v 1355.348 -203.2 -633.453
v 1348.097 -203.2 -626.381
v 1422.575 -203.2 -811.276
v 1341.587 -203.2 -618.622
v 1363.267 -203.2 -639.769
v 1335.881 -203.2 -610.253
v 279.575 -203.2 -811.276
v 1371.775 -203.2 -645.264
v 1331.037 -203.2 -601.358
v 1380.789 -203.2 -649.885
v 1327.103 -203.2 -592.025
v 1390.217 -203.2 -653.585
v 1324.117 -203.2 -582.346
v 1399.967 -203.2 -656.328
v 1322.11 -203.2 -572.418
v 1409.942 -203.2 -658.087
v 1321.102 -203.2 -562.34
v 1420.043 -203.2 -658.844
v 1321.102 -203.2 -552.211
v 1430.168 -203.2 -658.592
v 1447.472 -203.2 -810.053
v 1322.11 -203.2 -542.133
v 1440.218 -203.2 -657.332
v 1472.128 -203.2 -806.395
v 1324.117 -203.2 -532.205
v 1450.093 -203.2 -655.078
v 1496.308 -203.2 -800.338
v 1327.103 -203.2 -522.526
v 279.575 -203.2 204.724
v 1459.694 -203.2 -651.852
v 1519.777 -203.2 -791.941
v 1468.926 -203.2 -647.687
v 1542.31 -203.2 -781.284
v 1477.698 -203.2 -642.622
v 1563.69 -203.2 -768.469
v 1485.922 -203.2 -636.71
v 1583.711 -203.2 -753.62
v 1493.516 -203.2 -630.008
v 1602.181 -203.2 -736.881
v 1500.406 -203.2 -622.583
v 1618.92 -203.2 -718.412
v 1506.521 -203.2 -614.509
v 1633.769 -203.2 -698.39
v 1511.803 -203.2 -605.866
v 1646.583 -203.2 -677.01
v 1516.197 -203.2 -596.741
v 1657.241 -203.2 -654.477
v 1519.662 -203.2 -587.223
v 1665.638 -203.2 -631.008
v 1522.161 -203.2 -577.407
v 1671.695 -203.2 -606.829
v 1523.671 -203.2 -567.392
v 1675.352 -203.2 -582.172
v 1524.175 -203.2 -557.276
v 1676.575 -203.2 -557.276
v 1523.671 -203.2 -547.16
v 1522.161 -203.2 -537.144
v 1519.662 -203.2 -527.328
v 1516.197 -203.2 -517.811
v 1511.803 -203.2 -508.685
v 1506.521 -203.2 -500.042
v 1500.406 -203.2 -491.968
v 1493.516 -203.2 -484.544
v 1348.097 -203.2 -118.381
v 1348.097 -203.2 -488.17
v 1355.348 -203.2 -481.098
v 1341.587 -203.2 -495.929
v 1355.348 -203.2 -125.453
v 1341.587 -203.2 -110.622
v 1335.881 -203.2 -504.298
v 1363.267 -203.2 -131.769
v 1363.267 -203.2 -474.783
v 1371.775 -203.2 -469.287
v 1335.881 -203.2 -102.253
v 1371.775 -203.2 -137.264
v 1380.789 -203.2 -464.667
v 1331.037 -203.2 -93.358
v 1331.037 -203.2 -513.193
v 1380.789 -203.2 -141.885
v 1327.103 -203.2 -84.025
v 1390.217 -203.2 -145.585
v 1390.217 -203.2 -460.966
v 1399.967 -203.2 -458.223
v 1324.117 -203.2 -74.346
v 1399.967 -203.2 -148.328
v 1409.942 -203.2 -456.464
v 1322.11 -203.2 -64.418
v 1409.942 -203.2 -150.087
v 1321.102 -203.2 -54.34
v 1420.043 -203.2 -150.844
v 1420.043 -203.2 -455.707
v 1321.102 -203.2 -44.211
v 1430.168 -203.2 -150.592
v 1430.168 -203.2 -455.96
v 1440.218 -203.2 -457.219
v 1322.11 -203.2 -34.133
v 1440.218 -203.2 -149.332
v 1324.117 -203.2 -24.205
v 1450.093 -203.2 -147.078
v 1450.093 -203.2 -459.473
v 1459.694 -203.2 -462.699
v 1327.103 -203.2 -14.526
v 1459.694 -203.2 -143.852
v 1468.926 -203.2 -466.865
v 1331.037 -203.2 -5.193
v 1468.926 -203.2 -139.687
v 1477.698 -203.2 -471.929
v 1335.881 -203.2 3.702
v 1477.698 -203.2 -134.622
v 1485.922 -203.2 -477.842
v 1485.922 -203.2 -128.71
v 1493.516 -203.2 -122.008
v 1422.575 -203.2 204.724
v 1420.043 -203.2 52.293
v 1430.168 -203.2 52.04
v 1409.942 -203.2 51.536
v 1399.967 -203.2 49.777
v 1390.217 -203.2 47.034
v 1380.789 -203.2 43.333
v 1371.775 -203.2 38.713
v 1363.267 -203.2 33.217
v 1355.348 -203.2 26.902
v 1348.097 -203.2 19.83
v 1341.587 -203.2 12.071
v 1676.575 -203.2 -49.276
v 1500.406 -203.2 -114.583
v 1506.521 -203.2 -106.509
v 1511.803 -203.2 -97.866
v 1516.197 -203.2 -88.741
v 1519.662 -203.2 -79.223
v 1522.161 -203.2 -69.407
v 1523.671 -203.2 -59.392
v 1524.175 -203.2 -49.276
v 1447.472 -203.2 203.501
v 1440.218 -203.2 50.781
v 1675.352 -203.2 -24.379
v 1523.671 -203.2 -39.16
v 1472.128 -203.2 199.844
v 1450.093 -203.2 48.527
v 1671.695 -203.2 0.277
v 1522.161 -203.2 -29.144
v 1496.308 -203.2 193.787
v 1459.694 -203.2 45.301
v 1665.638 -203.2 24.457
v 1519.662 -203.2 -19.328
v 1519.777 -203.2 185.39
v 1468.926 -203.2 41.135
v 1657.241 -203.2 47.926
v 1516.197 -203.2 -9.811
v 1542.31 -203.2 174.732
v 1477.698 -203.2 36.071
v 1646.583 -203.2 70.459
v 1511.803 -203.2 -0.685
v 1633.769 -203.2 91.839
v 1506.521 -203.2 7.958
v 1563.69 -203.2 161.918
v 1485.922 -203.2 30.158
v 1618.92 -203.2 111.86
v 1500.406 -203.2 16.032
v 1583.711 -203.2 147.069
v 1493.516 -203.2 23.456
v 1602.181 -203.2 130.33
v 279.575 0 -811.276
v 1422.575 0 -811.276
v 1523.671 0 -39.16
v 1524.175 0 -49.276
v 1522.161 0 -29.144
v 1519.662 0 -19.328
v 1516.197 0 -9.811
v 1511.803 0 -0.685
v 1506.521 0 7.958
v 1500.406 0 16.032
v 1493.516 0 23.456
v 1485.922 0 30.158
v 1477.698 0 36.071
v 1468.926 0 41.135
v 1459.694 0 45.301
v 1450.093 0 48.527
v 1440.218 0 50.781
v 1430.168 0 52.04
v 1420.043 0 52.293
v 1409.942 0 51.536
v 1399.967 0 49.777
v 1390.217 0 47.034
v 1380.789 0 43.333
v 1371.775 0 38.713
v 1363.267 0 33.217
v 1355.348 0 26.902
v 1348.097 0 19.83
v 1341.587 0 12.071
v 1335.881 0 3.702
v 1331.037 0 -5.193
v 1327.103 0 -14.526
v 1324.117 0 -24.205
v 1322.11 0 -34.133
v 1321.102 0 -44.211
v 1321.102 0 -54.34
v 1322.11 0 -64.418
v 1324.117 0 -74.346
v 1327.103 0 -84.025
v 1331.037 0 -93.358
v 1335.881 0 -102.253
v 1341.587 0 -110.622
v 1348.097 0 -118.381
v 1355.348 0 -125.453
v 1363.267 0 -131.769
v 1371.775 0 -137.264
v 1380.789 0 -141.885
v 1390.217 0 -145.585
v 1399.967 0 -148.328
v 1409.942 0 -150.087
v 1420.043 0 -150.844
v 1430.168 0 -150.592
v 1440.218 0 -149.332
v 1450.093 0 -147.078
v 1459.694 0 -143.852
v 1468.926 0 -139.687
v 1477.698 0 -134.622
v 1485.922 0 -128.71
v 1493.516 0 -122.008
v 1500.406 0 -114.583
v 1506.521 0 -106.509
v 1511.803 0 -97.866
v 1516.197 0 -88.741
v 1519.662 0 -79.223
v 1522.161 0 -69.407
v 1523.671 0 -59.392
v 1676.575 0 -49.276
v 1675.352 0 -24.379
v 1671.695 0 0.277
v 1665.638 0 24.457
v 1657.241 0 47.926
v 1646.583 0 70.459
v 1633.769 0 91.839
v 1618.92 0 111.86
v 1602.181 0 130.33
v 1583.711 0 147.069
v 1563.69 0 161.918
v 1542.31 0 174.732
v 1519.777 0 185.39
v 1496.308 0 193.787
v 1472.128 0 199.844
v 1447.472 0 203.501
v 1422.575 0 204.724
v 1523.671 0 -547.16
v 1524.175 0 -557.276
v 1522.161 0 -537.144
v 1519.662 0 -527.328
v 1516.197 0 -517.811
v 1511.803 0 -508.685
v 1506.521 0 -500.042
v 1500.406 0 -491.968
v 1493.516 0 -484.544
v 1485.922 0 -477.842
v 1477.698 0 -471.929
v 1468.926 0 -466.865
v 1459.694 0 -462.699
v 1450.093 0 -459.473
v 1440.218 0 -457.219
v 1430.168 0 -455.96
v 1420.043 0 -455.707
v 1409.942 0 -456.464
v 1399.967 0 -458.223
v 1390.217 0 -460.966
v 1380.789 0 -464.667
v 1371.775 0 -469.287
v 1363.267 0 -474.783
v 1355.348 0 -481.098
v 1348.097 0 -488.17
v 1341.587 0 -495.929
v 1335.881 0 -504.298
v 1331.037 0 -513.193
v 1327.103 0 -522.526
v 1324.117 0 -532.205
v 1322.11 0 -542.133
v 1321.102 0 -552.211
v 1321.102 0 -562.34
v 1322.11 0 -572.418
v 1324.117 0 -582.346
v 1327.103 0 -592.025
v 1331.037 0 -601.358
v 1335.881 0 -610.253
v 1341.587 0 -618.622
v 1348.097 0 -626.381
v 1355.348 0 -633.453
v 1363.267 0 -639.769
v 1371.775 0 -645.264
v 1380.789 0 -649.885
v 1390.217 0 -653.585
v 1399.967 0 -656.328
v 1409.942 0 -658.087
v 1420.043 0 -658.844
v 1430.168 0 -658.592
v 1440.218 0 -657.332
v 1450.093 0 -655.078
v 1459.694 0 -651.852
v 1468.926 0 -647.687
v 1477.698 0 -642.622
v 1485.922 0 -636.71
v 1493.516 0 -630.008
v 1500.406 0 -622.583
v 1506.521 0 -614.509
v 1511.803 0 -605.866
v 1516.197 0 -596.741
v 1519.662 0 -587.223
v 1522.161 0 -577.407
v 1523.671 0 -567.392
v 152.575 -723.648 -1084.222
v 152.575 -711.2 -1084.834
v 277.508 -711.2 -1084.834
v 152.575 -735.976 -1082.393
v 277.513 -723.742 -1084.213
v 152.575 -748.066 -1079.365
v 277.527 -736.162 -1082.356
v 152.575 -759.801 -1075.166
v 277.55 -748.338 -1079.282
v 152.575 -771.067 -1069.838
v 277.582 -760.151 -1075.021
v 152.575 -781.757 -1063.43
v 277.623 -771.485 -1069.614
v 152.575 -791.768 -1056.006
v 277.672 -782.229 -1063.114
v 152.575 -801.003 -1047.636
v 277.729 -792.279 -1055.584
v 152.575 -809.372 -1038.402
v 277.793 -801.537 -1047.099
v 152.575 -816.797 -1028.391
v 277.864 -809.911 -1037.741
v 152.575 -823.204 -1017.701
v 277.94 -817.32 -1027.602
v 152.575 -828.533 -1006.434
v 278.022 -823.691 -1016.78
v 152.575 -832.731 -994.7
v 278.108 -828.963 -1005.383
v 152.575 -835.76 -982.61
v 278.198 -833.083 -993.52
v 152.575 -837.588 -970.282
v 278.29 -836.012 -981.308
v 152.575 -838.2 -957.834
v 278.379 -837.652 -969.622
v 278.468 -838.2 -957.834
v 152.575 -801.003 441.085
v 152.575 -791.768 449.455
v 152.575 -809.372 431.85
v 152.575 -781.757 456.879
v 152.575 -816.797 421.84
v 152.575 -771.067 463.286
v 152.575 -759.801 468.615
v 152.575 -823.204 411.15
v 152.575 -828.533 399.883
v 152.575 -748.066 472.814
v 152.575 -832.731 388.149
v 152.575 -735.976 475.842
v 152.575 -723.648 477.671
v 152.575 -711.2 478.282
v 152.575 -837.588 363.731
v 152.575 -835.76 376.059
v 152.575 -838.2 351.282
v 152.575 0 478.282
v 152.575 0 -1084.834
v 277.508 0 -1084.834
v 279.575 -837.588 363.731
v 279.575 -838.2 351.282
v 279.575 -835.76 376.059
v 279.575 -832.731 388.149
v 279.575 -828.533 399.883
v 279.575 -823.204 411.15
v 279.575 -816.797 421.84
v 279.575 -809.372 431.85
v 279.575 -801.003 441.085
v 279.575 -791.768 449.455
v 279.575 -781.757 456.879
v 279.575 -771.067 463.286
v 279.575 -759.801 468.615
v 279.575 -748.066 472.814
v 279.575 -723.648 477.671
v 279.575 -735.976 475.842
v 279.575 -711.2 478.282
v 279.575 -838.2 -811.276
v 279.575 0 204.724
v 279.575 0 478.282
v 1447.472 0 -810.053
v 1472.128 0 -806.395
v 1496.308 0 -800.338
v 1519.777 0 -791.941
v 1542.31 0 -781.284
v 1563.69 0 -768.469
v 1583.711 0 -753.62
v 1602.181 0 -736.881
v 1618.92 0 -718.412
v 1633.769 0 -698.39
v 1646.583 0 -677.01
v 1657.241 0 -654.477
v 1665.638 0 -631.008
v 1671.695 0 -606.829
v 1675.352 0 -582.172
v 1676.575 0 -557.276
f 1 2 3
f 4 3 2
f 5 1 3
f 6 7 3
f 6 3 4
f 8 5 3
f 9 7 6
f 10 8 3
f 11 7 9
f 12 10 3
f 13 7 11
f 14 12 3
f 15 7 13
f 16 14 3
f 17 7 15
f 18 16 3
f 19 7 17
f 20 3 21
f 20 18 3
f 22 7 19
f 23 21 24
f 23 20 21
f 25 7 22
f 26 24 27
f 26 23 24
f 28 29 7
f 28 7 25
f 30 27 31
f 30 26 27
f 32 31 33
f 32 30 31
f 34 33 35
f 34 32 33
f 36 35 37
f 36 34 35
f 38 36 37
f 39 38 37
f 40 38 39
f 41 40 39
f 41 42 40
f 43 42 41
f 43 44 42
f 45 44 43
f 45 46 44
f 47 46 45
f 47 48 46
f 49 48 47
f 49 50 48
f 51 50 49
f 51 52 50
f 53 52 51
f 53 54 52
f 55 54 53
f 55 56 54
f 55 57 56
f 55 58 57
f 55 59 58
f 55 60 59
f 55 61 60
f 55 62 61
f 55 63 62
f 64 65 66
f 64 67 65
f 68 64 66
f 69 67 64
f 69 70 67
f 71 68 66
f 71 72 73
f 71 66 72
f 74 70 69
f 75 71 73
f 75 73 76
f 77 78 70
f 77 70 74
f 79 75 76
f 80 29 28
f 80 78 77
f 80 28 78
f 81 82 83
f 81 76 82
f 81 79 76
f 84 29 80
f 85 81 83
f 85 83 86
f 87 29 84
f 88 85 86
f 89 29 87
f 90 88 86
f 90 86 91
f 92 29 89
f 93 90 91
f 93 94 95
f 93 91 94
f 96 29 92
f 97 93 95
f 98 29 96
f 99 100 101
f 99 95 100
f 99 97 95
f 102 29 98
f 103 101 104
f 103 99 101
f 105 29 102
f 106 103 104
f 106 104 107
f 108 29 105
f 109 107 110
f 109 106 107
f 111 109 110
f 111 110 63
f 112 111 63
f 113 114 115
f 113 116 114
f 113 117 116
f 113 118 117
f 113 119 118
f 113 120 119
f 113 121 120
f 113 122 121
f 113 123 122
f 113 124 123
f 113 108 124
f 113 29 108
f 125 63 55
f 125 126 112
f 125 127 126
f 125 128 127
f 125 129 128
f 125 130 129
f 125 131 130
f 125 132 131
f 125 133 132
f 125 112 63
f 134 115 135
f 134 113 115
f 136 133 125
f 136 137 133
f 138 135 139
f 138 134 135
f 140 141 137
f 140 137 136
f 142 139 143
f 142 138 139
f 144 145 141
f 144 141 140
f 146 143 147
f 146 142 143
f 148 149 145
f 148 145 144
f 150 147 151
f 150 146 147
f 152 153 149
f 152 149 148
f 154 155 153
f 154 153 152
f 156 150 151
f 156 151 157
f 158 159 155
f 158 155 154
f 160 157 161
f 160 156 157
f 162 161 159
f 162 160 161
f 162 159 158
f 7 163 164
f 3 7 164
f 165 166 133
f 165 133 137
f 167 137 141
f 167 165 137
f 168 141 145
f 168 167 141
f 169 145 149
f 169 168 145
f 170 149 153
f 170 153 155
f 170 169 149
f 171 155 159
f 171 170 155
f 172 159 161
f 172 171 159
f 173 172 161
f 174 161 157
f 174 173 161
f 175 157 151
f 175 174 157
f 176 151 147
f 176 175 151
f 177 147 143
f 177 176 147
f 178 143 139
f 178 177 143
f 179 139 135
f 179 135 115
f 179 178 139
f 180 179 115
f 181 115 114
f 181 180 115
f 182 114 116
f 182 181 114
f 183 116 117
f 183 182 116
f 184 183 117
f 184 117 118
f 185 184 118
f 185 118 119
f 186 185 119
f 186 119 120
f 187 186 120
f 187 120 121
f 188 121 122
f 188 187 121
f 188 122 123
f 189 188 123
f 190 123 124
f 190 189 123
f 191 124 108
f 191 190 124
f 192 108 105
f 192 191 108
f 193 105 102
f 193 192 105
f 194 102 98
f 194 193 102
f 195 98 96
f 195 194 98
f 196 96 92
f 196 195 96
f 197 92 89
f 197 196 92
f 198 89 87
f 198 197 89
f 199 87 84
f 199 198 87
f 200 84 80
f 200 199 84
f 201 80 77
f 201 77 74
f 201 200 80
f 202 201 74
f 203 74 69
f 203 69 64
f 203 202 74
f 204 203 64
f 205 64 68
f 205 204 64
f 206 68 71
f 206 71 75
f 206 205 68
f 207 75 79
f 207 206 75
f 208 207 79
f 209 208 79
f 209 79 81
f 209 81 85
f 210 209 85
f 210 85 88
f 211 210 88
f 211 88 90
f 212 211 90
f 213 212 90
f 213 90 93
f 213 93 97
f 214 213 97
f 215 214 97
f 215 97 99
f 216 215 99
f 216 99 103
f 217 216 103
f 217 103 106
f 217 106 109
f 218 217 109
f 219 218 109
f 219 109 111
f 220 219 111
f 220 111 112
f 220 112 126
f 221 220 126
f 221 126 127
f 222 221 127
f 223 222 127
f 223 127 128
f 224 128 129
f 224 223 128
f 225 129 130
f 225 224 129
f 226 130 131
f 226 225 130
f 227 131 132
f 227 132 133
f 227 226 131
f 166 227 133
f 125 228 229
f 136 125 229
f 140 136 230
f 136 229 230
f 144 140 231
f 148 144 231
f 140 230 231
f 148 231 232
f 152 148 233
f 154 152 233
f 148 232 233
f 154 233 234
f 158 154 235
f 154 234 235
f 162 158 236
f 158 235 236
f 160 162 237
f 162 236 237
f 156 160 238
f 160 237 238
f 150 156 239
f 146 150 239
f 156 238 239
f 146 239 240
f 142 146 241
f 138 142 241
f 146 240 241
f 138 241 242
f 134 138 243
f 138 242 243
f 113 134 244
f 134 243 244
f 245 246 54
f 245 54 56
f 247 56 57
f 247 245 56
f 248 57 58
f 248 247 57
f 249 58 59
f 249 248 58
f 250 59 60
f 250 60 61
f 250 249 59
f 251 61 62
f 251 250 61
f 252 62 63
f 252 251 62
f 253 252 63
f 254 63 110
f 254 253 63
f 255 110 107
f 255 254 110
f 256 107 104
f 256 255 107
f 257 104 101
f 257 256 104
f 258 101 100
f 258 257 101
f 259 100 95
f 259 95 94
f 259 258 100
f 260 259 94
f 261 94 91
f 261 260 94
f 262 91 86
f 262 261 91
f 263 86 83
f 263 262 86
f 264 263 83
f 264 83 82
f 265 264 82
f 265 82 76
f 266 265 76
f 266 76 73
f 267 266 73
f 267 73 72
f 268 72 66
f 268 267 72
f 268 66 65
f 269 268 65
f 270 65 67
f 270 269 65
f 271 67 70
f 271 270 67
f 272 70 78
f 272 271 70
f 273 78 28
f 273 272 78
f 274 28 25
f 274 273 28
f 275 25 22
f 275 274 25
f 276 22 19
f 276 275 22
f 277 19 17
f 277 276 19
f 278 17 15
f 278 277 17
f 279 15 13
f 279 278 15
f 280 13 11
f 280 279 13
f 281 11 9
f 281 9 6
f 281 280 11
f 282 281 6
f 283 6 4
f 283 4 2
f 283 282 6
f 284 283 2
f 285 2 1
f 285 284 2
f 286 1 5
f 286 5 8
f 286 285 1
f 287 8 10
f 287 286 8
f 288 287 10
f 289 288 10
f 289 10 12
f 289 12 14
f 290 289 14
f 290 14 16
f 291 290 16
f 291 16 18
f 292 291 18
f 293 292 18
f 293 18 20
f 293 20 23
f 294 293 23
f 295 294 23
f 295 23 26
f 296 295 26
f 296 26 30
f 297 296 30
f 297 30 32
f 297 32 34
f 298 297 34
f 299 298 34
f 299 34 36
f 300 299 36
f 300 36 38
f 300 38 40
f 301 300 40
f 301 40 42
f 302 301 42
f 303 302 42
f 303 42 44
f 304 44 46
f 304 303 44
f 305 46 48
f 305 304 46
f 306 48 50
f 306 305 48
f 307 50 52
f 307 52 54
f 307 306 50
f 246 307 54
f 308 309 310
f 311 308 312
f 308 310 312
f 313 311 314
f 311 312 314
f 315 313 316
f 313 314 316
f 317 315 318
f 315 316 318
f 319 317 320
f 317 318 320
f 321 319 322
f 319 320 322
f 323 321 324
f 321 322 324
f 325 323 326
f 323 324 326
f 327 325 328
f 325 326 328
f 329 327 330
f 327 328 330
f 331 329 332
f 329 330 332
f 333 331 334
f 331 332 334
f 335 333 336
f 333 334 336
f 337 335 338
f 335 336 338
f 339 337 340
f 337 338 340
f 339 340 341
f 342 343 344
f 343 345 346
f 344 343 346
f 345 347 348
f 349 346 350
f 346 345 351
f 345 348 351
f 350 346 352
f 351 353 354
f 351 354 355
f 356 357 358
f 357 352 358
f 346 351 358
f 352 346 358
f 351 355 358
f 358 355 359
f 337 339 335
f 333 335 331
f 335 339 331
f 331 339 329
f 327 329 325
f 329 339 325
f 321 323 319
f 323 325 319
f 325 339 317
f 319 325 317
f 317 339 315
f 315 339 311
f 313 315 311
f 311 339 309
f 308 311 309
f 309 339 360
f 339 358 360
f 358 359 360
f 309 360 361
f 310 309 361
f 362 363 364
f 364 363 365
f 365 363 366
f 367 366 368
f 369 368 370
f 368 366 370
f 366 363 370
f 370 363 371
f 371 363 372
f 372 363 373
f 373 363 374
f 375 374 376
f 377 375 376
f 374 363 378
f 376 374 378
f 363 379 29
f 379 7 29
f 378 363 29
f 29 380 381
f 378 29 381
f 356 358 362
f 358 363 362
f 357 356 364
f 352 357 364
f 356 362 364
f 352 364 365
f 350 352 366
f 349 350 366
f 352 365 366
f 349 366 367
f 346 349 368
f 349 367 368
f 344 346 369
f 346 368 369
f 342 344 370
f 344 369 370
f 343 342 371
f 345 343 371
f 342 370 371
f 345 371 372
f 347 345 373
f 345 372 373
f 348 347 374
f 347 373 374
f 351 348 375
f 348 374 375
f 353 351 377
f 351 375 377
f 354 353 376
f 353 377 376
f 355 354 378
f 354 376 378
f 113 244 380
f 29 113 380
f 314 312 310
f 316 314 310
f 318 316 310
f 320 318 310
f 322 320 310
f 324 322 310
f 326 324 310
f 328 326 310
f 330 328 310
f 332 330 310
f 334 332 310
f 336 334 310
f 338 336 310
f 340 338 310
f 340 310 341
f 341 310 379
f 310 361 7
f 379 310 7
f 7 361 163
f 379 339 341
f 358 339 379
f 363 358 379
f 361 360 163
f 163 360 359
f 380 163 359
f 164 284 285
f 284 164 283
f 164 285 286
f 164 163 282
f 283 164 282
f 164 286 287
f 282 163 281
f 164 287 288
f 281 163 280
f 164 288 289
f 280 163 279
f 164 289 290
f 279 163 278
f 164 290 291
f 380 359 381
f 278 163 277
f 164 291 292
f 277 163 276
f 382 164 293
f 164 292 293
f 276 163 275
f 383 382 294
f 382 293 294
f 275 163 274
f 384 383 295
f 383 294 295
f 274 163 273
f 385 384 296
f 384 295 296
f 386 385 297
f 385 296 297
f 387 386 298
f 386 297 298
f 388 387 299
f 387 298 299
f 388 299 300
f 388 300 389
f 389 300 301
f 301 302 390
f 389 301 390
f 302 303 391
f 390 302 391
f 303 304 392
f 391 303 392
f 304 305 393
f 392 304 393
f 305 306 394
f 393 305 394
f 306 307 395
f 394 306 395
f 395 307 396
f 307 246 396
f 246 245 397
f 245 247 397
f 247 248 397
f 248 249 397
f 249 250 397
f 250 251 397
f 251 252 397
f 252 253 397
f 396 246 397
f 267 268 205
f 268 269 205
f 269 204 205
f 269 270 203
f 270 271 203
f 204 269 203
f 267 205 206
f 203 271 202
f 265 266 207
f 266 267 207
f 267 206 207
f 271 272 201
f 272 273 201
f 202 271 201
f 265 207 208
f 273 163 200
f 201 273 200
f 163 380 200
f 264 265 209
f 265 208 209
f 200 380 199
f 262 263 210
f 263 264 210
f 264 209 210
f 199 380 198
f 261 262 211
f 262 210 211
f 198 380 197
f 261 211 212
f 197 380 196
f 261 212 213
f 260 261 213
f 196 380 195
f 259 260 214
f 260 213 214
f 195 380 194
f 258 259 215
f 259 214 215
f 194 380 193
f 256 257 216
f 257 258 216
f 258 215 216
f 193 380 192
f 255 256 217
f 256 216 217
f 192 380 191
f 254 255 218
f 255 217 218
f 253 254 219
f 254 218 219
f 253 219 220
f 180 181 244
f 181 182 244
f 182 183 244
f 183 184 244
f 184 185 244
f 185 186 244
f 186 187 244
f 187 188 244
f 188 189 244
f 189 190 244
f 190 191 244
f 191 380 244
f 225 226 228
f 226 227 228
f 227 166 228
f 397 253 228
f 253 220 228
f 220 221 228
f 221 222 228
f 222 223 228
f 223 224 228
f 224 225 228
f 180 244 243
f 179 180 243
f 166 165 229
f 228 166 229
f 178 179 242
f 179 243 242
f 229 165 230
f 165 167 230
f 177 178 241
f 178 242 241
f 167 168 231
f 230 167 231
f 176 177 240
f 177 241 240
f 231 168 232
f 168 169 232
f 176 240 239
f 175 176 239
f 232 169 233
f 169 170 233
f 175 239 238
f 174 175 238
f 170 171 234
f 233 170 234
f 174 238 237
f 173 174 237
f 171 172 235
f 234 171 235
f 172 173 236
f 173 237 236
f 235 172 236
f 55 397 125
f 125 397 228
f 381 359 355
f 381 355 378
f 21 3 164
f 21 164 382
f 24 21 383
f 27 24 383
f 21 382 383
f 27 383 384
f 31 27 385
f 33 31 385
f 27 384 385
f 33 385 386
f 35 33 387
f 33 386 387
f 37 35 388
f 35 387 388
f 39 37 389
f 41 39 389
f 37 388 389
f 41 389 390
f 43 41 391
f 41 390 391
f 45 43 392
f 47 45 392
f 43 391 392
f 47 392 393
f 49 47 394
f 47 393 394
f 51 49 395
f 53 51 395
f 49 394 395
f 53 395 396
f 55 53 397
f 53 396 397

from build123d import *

# Parameters (mm, degrees)
F0_W     = 127
F0_H     = 273.558
F0_H_2   = 431.8
F0_R     = 101.6
F0_H_3   = 152.4
F0_W_2   = 1397
F1_DEPTH = 203.2
F2_DEPTH = 838.2
F4_R     = 127


with BuildPart() as f1:
    # F0 (on Front) → F1 (new body)
    with BuildSketch(Plane.XZ):
        with Locations((216.0754676017, 341.5033780212)):
            Rectangle(F0_W, F0_H)
        with Locations((216.0754676017, -11.1756219788)):
            Rectangle(F0_W, F0_H_2)
        with BuildLine():
            Line((1422.5754676017, 204.7243780212), (279.5754676017, 204.7243780212))
            Line((279.5754676017, 204.7243780212), (279.5754676017, -227.0756219788))
            Line((279.5754676017, -227.0756219788), (1676.5754676017, -227.0756219788))
            Line((1676.5754676017, -227.0756219788), (1676.5754676017, -49.2756219788))
            ThreePointArc((1676.5754676017, -49.2756219788), (1602.1805900231, 130.3295004426), (1422.5754676017, 204.7243780212))
        make_face()
        with Locations((1422.5754676017, -49.2756219788)):
            Circle(F0_R, mode=Mode.SUBTRACT)
        with Locations((216.0754676017, -303.2756219788)):
            Rectangle(F0_W, F0_H_3)
        with Locations((978.0754676017, -303.2756219788)):
            Rectangle(F0_W_2, F0_H_3)
        with Locations((216.0754676017, -595.3756219788)):
            Rectangle(F0_W, F0_H_2)
        with BuildLine():
            Line((1676.5754676017, -379.4756219788), (279.5754676017, -379.4756219788))
            Line((279.5754676017, -379.4756219788), (279.5754676017, -811.2756219788))
            Line((279.5754676017, -811.2756219788), (1422.5754676017, -811.2756219788))
            ThreePointArc((1422.5754676017, -811.2756219788), (1602.1805900231, -736.8807444001), (1676.5754676017, -557.2756219788))
            Line((1676.5754676017, -557.2756219788), (1676.5754676017, -379.4756219788))
        make_face()
        with Locations((1422.5754676017, -557.2756219788)):
            Circle(F0_R, mode=Mode.SUBTRACT)
        Polygon((279.5754676017, -811.2756219788), (152.5754676017, -811.2756219788), (152.5754676017, -1084.8336219788), (277.5078122768, -1084.8336219788), align=None)
    extrude(amount=F1_DEPTH)

    # F0 (on Front) → F2 (join)
    with BuildSketch(Plane.XZ):
        Polygon((279.5754676017, -811.2756219788), (152.5754676017, -811.2756219788), (152.5754676017, -1084.8336219788), (277.5078122768, -1084.8336219788), align=None)
        with Locations((216.0754676017, -595.3756219788)):
            Rectangle(F0_W, F0_H_2)
        with Locations((216.0754676017, -303.2756219788)):
            Rectangle(F0_W, F0_H_3)
        with Locations((216.0754676017, -11.1756219788)):
            Rectangle(F0_W, F0_H_2)
        with Locations((216.0754676017, 341.5033780212)):
            Rectangle(F0_W, F0_H)
    extrude(amount=F2_DEPTH)

    # F4
    f4_edges = [f1.edges().sort_by_distance(p)[0] for p in [
        (216.075468, -838.2, 478.282378),
        (215.04164, -838.2, -1084.833622),
    ]]
    fillet(f4_edges, radius=F4_R)


solid = f1.part
